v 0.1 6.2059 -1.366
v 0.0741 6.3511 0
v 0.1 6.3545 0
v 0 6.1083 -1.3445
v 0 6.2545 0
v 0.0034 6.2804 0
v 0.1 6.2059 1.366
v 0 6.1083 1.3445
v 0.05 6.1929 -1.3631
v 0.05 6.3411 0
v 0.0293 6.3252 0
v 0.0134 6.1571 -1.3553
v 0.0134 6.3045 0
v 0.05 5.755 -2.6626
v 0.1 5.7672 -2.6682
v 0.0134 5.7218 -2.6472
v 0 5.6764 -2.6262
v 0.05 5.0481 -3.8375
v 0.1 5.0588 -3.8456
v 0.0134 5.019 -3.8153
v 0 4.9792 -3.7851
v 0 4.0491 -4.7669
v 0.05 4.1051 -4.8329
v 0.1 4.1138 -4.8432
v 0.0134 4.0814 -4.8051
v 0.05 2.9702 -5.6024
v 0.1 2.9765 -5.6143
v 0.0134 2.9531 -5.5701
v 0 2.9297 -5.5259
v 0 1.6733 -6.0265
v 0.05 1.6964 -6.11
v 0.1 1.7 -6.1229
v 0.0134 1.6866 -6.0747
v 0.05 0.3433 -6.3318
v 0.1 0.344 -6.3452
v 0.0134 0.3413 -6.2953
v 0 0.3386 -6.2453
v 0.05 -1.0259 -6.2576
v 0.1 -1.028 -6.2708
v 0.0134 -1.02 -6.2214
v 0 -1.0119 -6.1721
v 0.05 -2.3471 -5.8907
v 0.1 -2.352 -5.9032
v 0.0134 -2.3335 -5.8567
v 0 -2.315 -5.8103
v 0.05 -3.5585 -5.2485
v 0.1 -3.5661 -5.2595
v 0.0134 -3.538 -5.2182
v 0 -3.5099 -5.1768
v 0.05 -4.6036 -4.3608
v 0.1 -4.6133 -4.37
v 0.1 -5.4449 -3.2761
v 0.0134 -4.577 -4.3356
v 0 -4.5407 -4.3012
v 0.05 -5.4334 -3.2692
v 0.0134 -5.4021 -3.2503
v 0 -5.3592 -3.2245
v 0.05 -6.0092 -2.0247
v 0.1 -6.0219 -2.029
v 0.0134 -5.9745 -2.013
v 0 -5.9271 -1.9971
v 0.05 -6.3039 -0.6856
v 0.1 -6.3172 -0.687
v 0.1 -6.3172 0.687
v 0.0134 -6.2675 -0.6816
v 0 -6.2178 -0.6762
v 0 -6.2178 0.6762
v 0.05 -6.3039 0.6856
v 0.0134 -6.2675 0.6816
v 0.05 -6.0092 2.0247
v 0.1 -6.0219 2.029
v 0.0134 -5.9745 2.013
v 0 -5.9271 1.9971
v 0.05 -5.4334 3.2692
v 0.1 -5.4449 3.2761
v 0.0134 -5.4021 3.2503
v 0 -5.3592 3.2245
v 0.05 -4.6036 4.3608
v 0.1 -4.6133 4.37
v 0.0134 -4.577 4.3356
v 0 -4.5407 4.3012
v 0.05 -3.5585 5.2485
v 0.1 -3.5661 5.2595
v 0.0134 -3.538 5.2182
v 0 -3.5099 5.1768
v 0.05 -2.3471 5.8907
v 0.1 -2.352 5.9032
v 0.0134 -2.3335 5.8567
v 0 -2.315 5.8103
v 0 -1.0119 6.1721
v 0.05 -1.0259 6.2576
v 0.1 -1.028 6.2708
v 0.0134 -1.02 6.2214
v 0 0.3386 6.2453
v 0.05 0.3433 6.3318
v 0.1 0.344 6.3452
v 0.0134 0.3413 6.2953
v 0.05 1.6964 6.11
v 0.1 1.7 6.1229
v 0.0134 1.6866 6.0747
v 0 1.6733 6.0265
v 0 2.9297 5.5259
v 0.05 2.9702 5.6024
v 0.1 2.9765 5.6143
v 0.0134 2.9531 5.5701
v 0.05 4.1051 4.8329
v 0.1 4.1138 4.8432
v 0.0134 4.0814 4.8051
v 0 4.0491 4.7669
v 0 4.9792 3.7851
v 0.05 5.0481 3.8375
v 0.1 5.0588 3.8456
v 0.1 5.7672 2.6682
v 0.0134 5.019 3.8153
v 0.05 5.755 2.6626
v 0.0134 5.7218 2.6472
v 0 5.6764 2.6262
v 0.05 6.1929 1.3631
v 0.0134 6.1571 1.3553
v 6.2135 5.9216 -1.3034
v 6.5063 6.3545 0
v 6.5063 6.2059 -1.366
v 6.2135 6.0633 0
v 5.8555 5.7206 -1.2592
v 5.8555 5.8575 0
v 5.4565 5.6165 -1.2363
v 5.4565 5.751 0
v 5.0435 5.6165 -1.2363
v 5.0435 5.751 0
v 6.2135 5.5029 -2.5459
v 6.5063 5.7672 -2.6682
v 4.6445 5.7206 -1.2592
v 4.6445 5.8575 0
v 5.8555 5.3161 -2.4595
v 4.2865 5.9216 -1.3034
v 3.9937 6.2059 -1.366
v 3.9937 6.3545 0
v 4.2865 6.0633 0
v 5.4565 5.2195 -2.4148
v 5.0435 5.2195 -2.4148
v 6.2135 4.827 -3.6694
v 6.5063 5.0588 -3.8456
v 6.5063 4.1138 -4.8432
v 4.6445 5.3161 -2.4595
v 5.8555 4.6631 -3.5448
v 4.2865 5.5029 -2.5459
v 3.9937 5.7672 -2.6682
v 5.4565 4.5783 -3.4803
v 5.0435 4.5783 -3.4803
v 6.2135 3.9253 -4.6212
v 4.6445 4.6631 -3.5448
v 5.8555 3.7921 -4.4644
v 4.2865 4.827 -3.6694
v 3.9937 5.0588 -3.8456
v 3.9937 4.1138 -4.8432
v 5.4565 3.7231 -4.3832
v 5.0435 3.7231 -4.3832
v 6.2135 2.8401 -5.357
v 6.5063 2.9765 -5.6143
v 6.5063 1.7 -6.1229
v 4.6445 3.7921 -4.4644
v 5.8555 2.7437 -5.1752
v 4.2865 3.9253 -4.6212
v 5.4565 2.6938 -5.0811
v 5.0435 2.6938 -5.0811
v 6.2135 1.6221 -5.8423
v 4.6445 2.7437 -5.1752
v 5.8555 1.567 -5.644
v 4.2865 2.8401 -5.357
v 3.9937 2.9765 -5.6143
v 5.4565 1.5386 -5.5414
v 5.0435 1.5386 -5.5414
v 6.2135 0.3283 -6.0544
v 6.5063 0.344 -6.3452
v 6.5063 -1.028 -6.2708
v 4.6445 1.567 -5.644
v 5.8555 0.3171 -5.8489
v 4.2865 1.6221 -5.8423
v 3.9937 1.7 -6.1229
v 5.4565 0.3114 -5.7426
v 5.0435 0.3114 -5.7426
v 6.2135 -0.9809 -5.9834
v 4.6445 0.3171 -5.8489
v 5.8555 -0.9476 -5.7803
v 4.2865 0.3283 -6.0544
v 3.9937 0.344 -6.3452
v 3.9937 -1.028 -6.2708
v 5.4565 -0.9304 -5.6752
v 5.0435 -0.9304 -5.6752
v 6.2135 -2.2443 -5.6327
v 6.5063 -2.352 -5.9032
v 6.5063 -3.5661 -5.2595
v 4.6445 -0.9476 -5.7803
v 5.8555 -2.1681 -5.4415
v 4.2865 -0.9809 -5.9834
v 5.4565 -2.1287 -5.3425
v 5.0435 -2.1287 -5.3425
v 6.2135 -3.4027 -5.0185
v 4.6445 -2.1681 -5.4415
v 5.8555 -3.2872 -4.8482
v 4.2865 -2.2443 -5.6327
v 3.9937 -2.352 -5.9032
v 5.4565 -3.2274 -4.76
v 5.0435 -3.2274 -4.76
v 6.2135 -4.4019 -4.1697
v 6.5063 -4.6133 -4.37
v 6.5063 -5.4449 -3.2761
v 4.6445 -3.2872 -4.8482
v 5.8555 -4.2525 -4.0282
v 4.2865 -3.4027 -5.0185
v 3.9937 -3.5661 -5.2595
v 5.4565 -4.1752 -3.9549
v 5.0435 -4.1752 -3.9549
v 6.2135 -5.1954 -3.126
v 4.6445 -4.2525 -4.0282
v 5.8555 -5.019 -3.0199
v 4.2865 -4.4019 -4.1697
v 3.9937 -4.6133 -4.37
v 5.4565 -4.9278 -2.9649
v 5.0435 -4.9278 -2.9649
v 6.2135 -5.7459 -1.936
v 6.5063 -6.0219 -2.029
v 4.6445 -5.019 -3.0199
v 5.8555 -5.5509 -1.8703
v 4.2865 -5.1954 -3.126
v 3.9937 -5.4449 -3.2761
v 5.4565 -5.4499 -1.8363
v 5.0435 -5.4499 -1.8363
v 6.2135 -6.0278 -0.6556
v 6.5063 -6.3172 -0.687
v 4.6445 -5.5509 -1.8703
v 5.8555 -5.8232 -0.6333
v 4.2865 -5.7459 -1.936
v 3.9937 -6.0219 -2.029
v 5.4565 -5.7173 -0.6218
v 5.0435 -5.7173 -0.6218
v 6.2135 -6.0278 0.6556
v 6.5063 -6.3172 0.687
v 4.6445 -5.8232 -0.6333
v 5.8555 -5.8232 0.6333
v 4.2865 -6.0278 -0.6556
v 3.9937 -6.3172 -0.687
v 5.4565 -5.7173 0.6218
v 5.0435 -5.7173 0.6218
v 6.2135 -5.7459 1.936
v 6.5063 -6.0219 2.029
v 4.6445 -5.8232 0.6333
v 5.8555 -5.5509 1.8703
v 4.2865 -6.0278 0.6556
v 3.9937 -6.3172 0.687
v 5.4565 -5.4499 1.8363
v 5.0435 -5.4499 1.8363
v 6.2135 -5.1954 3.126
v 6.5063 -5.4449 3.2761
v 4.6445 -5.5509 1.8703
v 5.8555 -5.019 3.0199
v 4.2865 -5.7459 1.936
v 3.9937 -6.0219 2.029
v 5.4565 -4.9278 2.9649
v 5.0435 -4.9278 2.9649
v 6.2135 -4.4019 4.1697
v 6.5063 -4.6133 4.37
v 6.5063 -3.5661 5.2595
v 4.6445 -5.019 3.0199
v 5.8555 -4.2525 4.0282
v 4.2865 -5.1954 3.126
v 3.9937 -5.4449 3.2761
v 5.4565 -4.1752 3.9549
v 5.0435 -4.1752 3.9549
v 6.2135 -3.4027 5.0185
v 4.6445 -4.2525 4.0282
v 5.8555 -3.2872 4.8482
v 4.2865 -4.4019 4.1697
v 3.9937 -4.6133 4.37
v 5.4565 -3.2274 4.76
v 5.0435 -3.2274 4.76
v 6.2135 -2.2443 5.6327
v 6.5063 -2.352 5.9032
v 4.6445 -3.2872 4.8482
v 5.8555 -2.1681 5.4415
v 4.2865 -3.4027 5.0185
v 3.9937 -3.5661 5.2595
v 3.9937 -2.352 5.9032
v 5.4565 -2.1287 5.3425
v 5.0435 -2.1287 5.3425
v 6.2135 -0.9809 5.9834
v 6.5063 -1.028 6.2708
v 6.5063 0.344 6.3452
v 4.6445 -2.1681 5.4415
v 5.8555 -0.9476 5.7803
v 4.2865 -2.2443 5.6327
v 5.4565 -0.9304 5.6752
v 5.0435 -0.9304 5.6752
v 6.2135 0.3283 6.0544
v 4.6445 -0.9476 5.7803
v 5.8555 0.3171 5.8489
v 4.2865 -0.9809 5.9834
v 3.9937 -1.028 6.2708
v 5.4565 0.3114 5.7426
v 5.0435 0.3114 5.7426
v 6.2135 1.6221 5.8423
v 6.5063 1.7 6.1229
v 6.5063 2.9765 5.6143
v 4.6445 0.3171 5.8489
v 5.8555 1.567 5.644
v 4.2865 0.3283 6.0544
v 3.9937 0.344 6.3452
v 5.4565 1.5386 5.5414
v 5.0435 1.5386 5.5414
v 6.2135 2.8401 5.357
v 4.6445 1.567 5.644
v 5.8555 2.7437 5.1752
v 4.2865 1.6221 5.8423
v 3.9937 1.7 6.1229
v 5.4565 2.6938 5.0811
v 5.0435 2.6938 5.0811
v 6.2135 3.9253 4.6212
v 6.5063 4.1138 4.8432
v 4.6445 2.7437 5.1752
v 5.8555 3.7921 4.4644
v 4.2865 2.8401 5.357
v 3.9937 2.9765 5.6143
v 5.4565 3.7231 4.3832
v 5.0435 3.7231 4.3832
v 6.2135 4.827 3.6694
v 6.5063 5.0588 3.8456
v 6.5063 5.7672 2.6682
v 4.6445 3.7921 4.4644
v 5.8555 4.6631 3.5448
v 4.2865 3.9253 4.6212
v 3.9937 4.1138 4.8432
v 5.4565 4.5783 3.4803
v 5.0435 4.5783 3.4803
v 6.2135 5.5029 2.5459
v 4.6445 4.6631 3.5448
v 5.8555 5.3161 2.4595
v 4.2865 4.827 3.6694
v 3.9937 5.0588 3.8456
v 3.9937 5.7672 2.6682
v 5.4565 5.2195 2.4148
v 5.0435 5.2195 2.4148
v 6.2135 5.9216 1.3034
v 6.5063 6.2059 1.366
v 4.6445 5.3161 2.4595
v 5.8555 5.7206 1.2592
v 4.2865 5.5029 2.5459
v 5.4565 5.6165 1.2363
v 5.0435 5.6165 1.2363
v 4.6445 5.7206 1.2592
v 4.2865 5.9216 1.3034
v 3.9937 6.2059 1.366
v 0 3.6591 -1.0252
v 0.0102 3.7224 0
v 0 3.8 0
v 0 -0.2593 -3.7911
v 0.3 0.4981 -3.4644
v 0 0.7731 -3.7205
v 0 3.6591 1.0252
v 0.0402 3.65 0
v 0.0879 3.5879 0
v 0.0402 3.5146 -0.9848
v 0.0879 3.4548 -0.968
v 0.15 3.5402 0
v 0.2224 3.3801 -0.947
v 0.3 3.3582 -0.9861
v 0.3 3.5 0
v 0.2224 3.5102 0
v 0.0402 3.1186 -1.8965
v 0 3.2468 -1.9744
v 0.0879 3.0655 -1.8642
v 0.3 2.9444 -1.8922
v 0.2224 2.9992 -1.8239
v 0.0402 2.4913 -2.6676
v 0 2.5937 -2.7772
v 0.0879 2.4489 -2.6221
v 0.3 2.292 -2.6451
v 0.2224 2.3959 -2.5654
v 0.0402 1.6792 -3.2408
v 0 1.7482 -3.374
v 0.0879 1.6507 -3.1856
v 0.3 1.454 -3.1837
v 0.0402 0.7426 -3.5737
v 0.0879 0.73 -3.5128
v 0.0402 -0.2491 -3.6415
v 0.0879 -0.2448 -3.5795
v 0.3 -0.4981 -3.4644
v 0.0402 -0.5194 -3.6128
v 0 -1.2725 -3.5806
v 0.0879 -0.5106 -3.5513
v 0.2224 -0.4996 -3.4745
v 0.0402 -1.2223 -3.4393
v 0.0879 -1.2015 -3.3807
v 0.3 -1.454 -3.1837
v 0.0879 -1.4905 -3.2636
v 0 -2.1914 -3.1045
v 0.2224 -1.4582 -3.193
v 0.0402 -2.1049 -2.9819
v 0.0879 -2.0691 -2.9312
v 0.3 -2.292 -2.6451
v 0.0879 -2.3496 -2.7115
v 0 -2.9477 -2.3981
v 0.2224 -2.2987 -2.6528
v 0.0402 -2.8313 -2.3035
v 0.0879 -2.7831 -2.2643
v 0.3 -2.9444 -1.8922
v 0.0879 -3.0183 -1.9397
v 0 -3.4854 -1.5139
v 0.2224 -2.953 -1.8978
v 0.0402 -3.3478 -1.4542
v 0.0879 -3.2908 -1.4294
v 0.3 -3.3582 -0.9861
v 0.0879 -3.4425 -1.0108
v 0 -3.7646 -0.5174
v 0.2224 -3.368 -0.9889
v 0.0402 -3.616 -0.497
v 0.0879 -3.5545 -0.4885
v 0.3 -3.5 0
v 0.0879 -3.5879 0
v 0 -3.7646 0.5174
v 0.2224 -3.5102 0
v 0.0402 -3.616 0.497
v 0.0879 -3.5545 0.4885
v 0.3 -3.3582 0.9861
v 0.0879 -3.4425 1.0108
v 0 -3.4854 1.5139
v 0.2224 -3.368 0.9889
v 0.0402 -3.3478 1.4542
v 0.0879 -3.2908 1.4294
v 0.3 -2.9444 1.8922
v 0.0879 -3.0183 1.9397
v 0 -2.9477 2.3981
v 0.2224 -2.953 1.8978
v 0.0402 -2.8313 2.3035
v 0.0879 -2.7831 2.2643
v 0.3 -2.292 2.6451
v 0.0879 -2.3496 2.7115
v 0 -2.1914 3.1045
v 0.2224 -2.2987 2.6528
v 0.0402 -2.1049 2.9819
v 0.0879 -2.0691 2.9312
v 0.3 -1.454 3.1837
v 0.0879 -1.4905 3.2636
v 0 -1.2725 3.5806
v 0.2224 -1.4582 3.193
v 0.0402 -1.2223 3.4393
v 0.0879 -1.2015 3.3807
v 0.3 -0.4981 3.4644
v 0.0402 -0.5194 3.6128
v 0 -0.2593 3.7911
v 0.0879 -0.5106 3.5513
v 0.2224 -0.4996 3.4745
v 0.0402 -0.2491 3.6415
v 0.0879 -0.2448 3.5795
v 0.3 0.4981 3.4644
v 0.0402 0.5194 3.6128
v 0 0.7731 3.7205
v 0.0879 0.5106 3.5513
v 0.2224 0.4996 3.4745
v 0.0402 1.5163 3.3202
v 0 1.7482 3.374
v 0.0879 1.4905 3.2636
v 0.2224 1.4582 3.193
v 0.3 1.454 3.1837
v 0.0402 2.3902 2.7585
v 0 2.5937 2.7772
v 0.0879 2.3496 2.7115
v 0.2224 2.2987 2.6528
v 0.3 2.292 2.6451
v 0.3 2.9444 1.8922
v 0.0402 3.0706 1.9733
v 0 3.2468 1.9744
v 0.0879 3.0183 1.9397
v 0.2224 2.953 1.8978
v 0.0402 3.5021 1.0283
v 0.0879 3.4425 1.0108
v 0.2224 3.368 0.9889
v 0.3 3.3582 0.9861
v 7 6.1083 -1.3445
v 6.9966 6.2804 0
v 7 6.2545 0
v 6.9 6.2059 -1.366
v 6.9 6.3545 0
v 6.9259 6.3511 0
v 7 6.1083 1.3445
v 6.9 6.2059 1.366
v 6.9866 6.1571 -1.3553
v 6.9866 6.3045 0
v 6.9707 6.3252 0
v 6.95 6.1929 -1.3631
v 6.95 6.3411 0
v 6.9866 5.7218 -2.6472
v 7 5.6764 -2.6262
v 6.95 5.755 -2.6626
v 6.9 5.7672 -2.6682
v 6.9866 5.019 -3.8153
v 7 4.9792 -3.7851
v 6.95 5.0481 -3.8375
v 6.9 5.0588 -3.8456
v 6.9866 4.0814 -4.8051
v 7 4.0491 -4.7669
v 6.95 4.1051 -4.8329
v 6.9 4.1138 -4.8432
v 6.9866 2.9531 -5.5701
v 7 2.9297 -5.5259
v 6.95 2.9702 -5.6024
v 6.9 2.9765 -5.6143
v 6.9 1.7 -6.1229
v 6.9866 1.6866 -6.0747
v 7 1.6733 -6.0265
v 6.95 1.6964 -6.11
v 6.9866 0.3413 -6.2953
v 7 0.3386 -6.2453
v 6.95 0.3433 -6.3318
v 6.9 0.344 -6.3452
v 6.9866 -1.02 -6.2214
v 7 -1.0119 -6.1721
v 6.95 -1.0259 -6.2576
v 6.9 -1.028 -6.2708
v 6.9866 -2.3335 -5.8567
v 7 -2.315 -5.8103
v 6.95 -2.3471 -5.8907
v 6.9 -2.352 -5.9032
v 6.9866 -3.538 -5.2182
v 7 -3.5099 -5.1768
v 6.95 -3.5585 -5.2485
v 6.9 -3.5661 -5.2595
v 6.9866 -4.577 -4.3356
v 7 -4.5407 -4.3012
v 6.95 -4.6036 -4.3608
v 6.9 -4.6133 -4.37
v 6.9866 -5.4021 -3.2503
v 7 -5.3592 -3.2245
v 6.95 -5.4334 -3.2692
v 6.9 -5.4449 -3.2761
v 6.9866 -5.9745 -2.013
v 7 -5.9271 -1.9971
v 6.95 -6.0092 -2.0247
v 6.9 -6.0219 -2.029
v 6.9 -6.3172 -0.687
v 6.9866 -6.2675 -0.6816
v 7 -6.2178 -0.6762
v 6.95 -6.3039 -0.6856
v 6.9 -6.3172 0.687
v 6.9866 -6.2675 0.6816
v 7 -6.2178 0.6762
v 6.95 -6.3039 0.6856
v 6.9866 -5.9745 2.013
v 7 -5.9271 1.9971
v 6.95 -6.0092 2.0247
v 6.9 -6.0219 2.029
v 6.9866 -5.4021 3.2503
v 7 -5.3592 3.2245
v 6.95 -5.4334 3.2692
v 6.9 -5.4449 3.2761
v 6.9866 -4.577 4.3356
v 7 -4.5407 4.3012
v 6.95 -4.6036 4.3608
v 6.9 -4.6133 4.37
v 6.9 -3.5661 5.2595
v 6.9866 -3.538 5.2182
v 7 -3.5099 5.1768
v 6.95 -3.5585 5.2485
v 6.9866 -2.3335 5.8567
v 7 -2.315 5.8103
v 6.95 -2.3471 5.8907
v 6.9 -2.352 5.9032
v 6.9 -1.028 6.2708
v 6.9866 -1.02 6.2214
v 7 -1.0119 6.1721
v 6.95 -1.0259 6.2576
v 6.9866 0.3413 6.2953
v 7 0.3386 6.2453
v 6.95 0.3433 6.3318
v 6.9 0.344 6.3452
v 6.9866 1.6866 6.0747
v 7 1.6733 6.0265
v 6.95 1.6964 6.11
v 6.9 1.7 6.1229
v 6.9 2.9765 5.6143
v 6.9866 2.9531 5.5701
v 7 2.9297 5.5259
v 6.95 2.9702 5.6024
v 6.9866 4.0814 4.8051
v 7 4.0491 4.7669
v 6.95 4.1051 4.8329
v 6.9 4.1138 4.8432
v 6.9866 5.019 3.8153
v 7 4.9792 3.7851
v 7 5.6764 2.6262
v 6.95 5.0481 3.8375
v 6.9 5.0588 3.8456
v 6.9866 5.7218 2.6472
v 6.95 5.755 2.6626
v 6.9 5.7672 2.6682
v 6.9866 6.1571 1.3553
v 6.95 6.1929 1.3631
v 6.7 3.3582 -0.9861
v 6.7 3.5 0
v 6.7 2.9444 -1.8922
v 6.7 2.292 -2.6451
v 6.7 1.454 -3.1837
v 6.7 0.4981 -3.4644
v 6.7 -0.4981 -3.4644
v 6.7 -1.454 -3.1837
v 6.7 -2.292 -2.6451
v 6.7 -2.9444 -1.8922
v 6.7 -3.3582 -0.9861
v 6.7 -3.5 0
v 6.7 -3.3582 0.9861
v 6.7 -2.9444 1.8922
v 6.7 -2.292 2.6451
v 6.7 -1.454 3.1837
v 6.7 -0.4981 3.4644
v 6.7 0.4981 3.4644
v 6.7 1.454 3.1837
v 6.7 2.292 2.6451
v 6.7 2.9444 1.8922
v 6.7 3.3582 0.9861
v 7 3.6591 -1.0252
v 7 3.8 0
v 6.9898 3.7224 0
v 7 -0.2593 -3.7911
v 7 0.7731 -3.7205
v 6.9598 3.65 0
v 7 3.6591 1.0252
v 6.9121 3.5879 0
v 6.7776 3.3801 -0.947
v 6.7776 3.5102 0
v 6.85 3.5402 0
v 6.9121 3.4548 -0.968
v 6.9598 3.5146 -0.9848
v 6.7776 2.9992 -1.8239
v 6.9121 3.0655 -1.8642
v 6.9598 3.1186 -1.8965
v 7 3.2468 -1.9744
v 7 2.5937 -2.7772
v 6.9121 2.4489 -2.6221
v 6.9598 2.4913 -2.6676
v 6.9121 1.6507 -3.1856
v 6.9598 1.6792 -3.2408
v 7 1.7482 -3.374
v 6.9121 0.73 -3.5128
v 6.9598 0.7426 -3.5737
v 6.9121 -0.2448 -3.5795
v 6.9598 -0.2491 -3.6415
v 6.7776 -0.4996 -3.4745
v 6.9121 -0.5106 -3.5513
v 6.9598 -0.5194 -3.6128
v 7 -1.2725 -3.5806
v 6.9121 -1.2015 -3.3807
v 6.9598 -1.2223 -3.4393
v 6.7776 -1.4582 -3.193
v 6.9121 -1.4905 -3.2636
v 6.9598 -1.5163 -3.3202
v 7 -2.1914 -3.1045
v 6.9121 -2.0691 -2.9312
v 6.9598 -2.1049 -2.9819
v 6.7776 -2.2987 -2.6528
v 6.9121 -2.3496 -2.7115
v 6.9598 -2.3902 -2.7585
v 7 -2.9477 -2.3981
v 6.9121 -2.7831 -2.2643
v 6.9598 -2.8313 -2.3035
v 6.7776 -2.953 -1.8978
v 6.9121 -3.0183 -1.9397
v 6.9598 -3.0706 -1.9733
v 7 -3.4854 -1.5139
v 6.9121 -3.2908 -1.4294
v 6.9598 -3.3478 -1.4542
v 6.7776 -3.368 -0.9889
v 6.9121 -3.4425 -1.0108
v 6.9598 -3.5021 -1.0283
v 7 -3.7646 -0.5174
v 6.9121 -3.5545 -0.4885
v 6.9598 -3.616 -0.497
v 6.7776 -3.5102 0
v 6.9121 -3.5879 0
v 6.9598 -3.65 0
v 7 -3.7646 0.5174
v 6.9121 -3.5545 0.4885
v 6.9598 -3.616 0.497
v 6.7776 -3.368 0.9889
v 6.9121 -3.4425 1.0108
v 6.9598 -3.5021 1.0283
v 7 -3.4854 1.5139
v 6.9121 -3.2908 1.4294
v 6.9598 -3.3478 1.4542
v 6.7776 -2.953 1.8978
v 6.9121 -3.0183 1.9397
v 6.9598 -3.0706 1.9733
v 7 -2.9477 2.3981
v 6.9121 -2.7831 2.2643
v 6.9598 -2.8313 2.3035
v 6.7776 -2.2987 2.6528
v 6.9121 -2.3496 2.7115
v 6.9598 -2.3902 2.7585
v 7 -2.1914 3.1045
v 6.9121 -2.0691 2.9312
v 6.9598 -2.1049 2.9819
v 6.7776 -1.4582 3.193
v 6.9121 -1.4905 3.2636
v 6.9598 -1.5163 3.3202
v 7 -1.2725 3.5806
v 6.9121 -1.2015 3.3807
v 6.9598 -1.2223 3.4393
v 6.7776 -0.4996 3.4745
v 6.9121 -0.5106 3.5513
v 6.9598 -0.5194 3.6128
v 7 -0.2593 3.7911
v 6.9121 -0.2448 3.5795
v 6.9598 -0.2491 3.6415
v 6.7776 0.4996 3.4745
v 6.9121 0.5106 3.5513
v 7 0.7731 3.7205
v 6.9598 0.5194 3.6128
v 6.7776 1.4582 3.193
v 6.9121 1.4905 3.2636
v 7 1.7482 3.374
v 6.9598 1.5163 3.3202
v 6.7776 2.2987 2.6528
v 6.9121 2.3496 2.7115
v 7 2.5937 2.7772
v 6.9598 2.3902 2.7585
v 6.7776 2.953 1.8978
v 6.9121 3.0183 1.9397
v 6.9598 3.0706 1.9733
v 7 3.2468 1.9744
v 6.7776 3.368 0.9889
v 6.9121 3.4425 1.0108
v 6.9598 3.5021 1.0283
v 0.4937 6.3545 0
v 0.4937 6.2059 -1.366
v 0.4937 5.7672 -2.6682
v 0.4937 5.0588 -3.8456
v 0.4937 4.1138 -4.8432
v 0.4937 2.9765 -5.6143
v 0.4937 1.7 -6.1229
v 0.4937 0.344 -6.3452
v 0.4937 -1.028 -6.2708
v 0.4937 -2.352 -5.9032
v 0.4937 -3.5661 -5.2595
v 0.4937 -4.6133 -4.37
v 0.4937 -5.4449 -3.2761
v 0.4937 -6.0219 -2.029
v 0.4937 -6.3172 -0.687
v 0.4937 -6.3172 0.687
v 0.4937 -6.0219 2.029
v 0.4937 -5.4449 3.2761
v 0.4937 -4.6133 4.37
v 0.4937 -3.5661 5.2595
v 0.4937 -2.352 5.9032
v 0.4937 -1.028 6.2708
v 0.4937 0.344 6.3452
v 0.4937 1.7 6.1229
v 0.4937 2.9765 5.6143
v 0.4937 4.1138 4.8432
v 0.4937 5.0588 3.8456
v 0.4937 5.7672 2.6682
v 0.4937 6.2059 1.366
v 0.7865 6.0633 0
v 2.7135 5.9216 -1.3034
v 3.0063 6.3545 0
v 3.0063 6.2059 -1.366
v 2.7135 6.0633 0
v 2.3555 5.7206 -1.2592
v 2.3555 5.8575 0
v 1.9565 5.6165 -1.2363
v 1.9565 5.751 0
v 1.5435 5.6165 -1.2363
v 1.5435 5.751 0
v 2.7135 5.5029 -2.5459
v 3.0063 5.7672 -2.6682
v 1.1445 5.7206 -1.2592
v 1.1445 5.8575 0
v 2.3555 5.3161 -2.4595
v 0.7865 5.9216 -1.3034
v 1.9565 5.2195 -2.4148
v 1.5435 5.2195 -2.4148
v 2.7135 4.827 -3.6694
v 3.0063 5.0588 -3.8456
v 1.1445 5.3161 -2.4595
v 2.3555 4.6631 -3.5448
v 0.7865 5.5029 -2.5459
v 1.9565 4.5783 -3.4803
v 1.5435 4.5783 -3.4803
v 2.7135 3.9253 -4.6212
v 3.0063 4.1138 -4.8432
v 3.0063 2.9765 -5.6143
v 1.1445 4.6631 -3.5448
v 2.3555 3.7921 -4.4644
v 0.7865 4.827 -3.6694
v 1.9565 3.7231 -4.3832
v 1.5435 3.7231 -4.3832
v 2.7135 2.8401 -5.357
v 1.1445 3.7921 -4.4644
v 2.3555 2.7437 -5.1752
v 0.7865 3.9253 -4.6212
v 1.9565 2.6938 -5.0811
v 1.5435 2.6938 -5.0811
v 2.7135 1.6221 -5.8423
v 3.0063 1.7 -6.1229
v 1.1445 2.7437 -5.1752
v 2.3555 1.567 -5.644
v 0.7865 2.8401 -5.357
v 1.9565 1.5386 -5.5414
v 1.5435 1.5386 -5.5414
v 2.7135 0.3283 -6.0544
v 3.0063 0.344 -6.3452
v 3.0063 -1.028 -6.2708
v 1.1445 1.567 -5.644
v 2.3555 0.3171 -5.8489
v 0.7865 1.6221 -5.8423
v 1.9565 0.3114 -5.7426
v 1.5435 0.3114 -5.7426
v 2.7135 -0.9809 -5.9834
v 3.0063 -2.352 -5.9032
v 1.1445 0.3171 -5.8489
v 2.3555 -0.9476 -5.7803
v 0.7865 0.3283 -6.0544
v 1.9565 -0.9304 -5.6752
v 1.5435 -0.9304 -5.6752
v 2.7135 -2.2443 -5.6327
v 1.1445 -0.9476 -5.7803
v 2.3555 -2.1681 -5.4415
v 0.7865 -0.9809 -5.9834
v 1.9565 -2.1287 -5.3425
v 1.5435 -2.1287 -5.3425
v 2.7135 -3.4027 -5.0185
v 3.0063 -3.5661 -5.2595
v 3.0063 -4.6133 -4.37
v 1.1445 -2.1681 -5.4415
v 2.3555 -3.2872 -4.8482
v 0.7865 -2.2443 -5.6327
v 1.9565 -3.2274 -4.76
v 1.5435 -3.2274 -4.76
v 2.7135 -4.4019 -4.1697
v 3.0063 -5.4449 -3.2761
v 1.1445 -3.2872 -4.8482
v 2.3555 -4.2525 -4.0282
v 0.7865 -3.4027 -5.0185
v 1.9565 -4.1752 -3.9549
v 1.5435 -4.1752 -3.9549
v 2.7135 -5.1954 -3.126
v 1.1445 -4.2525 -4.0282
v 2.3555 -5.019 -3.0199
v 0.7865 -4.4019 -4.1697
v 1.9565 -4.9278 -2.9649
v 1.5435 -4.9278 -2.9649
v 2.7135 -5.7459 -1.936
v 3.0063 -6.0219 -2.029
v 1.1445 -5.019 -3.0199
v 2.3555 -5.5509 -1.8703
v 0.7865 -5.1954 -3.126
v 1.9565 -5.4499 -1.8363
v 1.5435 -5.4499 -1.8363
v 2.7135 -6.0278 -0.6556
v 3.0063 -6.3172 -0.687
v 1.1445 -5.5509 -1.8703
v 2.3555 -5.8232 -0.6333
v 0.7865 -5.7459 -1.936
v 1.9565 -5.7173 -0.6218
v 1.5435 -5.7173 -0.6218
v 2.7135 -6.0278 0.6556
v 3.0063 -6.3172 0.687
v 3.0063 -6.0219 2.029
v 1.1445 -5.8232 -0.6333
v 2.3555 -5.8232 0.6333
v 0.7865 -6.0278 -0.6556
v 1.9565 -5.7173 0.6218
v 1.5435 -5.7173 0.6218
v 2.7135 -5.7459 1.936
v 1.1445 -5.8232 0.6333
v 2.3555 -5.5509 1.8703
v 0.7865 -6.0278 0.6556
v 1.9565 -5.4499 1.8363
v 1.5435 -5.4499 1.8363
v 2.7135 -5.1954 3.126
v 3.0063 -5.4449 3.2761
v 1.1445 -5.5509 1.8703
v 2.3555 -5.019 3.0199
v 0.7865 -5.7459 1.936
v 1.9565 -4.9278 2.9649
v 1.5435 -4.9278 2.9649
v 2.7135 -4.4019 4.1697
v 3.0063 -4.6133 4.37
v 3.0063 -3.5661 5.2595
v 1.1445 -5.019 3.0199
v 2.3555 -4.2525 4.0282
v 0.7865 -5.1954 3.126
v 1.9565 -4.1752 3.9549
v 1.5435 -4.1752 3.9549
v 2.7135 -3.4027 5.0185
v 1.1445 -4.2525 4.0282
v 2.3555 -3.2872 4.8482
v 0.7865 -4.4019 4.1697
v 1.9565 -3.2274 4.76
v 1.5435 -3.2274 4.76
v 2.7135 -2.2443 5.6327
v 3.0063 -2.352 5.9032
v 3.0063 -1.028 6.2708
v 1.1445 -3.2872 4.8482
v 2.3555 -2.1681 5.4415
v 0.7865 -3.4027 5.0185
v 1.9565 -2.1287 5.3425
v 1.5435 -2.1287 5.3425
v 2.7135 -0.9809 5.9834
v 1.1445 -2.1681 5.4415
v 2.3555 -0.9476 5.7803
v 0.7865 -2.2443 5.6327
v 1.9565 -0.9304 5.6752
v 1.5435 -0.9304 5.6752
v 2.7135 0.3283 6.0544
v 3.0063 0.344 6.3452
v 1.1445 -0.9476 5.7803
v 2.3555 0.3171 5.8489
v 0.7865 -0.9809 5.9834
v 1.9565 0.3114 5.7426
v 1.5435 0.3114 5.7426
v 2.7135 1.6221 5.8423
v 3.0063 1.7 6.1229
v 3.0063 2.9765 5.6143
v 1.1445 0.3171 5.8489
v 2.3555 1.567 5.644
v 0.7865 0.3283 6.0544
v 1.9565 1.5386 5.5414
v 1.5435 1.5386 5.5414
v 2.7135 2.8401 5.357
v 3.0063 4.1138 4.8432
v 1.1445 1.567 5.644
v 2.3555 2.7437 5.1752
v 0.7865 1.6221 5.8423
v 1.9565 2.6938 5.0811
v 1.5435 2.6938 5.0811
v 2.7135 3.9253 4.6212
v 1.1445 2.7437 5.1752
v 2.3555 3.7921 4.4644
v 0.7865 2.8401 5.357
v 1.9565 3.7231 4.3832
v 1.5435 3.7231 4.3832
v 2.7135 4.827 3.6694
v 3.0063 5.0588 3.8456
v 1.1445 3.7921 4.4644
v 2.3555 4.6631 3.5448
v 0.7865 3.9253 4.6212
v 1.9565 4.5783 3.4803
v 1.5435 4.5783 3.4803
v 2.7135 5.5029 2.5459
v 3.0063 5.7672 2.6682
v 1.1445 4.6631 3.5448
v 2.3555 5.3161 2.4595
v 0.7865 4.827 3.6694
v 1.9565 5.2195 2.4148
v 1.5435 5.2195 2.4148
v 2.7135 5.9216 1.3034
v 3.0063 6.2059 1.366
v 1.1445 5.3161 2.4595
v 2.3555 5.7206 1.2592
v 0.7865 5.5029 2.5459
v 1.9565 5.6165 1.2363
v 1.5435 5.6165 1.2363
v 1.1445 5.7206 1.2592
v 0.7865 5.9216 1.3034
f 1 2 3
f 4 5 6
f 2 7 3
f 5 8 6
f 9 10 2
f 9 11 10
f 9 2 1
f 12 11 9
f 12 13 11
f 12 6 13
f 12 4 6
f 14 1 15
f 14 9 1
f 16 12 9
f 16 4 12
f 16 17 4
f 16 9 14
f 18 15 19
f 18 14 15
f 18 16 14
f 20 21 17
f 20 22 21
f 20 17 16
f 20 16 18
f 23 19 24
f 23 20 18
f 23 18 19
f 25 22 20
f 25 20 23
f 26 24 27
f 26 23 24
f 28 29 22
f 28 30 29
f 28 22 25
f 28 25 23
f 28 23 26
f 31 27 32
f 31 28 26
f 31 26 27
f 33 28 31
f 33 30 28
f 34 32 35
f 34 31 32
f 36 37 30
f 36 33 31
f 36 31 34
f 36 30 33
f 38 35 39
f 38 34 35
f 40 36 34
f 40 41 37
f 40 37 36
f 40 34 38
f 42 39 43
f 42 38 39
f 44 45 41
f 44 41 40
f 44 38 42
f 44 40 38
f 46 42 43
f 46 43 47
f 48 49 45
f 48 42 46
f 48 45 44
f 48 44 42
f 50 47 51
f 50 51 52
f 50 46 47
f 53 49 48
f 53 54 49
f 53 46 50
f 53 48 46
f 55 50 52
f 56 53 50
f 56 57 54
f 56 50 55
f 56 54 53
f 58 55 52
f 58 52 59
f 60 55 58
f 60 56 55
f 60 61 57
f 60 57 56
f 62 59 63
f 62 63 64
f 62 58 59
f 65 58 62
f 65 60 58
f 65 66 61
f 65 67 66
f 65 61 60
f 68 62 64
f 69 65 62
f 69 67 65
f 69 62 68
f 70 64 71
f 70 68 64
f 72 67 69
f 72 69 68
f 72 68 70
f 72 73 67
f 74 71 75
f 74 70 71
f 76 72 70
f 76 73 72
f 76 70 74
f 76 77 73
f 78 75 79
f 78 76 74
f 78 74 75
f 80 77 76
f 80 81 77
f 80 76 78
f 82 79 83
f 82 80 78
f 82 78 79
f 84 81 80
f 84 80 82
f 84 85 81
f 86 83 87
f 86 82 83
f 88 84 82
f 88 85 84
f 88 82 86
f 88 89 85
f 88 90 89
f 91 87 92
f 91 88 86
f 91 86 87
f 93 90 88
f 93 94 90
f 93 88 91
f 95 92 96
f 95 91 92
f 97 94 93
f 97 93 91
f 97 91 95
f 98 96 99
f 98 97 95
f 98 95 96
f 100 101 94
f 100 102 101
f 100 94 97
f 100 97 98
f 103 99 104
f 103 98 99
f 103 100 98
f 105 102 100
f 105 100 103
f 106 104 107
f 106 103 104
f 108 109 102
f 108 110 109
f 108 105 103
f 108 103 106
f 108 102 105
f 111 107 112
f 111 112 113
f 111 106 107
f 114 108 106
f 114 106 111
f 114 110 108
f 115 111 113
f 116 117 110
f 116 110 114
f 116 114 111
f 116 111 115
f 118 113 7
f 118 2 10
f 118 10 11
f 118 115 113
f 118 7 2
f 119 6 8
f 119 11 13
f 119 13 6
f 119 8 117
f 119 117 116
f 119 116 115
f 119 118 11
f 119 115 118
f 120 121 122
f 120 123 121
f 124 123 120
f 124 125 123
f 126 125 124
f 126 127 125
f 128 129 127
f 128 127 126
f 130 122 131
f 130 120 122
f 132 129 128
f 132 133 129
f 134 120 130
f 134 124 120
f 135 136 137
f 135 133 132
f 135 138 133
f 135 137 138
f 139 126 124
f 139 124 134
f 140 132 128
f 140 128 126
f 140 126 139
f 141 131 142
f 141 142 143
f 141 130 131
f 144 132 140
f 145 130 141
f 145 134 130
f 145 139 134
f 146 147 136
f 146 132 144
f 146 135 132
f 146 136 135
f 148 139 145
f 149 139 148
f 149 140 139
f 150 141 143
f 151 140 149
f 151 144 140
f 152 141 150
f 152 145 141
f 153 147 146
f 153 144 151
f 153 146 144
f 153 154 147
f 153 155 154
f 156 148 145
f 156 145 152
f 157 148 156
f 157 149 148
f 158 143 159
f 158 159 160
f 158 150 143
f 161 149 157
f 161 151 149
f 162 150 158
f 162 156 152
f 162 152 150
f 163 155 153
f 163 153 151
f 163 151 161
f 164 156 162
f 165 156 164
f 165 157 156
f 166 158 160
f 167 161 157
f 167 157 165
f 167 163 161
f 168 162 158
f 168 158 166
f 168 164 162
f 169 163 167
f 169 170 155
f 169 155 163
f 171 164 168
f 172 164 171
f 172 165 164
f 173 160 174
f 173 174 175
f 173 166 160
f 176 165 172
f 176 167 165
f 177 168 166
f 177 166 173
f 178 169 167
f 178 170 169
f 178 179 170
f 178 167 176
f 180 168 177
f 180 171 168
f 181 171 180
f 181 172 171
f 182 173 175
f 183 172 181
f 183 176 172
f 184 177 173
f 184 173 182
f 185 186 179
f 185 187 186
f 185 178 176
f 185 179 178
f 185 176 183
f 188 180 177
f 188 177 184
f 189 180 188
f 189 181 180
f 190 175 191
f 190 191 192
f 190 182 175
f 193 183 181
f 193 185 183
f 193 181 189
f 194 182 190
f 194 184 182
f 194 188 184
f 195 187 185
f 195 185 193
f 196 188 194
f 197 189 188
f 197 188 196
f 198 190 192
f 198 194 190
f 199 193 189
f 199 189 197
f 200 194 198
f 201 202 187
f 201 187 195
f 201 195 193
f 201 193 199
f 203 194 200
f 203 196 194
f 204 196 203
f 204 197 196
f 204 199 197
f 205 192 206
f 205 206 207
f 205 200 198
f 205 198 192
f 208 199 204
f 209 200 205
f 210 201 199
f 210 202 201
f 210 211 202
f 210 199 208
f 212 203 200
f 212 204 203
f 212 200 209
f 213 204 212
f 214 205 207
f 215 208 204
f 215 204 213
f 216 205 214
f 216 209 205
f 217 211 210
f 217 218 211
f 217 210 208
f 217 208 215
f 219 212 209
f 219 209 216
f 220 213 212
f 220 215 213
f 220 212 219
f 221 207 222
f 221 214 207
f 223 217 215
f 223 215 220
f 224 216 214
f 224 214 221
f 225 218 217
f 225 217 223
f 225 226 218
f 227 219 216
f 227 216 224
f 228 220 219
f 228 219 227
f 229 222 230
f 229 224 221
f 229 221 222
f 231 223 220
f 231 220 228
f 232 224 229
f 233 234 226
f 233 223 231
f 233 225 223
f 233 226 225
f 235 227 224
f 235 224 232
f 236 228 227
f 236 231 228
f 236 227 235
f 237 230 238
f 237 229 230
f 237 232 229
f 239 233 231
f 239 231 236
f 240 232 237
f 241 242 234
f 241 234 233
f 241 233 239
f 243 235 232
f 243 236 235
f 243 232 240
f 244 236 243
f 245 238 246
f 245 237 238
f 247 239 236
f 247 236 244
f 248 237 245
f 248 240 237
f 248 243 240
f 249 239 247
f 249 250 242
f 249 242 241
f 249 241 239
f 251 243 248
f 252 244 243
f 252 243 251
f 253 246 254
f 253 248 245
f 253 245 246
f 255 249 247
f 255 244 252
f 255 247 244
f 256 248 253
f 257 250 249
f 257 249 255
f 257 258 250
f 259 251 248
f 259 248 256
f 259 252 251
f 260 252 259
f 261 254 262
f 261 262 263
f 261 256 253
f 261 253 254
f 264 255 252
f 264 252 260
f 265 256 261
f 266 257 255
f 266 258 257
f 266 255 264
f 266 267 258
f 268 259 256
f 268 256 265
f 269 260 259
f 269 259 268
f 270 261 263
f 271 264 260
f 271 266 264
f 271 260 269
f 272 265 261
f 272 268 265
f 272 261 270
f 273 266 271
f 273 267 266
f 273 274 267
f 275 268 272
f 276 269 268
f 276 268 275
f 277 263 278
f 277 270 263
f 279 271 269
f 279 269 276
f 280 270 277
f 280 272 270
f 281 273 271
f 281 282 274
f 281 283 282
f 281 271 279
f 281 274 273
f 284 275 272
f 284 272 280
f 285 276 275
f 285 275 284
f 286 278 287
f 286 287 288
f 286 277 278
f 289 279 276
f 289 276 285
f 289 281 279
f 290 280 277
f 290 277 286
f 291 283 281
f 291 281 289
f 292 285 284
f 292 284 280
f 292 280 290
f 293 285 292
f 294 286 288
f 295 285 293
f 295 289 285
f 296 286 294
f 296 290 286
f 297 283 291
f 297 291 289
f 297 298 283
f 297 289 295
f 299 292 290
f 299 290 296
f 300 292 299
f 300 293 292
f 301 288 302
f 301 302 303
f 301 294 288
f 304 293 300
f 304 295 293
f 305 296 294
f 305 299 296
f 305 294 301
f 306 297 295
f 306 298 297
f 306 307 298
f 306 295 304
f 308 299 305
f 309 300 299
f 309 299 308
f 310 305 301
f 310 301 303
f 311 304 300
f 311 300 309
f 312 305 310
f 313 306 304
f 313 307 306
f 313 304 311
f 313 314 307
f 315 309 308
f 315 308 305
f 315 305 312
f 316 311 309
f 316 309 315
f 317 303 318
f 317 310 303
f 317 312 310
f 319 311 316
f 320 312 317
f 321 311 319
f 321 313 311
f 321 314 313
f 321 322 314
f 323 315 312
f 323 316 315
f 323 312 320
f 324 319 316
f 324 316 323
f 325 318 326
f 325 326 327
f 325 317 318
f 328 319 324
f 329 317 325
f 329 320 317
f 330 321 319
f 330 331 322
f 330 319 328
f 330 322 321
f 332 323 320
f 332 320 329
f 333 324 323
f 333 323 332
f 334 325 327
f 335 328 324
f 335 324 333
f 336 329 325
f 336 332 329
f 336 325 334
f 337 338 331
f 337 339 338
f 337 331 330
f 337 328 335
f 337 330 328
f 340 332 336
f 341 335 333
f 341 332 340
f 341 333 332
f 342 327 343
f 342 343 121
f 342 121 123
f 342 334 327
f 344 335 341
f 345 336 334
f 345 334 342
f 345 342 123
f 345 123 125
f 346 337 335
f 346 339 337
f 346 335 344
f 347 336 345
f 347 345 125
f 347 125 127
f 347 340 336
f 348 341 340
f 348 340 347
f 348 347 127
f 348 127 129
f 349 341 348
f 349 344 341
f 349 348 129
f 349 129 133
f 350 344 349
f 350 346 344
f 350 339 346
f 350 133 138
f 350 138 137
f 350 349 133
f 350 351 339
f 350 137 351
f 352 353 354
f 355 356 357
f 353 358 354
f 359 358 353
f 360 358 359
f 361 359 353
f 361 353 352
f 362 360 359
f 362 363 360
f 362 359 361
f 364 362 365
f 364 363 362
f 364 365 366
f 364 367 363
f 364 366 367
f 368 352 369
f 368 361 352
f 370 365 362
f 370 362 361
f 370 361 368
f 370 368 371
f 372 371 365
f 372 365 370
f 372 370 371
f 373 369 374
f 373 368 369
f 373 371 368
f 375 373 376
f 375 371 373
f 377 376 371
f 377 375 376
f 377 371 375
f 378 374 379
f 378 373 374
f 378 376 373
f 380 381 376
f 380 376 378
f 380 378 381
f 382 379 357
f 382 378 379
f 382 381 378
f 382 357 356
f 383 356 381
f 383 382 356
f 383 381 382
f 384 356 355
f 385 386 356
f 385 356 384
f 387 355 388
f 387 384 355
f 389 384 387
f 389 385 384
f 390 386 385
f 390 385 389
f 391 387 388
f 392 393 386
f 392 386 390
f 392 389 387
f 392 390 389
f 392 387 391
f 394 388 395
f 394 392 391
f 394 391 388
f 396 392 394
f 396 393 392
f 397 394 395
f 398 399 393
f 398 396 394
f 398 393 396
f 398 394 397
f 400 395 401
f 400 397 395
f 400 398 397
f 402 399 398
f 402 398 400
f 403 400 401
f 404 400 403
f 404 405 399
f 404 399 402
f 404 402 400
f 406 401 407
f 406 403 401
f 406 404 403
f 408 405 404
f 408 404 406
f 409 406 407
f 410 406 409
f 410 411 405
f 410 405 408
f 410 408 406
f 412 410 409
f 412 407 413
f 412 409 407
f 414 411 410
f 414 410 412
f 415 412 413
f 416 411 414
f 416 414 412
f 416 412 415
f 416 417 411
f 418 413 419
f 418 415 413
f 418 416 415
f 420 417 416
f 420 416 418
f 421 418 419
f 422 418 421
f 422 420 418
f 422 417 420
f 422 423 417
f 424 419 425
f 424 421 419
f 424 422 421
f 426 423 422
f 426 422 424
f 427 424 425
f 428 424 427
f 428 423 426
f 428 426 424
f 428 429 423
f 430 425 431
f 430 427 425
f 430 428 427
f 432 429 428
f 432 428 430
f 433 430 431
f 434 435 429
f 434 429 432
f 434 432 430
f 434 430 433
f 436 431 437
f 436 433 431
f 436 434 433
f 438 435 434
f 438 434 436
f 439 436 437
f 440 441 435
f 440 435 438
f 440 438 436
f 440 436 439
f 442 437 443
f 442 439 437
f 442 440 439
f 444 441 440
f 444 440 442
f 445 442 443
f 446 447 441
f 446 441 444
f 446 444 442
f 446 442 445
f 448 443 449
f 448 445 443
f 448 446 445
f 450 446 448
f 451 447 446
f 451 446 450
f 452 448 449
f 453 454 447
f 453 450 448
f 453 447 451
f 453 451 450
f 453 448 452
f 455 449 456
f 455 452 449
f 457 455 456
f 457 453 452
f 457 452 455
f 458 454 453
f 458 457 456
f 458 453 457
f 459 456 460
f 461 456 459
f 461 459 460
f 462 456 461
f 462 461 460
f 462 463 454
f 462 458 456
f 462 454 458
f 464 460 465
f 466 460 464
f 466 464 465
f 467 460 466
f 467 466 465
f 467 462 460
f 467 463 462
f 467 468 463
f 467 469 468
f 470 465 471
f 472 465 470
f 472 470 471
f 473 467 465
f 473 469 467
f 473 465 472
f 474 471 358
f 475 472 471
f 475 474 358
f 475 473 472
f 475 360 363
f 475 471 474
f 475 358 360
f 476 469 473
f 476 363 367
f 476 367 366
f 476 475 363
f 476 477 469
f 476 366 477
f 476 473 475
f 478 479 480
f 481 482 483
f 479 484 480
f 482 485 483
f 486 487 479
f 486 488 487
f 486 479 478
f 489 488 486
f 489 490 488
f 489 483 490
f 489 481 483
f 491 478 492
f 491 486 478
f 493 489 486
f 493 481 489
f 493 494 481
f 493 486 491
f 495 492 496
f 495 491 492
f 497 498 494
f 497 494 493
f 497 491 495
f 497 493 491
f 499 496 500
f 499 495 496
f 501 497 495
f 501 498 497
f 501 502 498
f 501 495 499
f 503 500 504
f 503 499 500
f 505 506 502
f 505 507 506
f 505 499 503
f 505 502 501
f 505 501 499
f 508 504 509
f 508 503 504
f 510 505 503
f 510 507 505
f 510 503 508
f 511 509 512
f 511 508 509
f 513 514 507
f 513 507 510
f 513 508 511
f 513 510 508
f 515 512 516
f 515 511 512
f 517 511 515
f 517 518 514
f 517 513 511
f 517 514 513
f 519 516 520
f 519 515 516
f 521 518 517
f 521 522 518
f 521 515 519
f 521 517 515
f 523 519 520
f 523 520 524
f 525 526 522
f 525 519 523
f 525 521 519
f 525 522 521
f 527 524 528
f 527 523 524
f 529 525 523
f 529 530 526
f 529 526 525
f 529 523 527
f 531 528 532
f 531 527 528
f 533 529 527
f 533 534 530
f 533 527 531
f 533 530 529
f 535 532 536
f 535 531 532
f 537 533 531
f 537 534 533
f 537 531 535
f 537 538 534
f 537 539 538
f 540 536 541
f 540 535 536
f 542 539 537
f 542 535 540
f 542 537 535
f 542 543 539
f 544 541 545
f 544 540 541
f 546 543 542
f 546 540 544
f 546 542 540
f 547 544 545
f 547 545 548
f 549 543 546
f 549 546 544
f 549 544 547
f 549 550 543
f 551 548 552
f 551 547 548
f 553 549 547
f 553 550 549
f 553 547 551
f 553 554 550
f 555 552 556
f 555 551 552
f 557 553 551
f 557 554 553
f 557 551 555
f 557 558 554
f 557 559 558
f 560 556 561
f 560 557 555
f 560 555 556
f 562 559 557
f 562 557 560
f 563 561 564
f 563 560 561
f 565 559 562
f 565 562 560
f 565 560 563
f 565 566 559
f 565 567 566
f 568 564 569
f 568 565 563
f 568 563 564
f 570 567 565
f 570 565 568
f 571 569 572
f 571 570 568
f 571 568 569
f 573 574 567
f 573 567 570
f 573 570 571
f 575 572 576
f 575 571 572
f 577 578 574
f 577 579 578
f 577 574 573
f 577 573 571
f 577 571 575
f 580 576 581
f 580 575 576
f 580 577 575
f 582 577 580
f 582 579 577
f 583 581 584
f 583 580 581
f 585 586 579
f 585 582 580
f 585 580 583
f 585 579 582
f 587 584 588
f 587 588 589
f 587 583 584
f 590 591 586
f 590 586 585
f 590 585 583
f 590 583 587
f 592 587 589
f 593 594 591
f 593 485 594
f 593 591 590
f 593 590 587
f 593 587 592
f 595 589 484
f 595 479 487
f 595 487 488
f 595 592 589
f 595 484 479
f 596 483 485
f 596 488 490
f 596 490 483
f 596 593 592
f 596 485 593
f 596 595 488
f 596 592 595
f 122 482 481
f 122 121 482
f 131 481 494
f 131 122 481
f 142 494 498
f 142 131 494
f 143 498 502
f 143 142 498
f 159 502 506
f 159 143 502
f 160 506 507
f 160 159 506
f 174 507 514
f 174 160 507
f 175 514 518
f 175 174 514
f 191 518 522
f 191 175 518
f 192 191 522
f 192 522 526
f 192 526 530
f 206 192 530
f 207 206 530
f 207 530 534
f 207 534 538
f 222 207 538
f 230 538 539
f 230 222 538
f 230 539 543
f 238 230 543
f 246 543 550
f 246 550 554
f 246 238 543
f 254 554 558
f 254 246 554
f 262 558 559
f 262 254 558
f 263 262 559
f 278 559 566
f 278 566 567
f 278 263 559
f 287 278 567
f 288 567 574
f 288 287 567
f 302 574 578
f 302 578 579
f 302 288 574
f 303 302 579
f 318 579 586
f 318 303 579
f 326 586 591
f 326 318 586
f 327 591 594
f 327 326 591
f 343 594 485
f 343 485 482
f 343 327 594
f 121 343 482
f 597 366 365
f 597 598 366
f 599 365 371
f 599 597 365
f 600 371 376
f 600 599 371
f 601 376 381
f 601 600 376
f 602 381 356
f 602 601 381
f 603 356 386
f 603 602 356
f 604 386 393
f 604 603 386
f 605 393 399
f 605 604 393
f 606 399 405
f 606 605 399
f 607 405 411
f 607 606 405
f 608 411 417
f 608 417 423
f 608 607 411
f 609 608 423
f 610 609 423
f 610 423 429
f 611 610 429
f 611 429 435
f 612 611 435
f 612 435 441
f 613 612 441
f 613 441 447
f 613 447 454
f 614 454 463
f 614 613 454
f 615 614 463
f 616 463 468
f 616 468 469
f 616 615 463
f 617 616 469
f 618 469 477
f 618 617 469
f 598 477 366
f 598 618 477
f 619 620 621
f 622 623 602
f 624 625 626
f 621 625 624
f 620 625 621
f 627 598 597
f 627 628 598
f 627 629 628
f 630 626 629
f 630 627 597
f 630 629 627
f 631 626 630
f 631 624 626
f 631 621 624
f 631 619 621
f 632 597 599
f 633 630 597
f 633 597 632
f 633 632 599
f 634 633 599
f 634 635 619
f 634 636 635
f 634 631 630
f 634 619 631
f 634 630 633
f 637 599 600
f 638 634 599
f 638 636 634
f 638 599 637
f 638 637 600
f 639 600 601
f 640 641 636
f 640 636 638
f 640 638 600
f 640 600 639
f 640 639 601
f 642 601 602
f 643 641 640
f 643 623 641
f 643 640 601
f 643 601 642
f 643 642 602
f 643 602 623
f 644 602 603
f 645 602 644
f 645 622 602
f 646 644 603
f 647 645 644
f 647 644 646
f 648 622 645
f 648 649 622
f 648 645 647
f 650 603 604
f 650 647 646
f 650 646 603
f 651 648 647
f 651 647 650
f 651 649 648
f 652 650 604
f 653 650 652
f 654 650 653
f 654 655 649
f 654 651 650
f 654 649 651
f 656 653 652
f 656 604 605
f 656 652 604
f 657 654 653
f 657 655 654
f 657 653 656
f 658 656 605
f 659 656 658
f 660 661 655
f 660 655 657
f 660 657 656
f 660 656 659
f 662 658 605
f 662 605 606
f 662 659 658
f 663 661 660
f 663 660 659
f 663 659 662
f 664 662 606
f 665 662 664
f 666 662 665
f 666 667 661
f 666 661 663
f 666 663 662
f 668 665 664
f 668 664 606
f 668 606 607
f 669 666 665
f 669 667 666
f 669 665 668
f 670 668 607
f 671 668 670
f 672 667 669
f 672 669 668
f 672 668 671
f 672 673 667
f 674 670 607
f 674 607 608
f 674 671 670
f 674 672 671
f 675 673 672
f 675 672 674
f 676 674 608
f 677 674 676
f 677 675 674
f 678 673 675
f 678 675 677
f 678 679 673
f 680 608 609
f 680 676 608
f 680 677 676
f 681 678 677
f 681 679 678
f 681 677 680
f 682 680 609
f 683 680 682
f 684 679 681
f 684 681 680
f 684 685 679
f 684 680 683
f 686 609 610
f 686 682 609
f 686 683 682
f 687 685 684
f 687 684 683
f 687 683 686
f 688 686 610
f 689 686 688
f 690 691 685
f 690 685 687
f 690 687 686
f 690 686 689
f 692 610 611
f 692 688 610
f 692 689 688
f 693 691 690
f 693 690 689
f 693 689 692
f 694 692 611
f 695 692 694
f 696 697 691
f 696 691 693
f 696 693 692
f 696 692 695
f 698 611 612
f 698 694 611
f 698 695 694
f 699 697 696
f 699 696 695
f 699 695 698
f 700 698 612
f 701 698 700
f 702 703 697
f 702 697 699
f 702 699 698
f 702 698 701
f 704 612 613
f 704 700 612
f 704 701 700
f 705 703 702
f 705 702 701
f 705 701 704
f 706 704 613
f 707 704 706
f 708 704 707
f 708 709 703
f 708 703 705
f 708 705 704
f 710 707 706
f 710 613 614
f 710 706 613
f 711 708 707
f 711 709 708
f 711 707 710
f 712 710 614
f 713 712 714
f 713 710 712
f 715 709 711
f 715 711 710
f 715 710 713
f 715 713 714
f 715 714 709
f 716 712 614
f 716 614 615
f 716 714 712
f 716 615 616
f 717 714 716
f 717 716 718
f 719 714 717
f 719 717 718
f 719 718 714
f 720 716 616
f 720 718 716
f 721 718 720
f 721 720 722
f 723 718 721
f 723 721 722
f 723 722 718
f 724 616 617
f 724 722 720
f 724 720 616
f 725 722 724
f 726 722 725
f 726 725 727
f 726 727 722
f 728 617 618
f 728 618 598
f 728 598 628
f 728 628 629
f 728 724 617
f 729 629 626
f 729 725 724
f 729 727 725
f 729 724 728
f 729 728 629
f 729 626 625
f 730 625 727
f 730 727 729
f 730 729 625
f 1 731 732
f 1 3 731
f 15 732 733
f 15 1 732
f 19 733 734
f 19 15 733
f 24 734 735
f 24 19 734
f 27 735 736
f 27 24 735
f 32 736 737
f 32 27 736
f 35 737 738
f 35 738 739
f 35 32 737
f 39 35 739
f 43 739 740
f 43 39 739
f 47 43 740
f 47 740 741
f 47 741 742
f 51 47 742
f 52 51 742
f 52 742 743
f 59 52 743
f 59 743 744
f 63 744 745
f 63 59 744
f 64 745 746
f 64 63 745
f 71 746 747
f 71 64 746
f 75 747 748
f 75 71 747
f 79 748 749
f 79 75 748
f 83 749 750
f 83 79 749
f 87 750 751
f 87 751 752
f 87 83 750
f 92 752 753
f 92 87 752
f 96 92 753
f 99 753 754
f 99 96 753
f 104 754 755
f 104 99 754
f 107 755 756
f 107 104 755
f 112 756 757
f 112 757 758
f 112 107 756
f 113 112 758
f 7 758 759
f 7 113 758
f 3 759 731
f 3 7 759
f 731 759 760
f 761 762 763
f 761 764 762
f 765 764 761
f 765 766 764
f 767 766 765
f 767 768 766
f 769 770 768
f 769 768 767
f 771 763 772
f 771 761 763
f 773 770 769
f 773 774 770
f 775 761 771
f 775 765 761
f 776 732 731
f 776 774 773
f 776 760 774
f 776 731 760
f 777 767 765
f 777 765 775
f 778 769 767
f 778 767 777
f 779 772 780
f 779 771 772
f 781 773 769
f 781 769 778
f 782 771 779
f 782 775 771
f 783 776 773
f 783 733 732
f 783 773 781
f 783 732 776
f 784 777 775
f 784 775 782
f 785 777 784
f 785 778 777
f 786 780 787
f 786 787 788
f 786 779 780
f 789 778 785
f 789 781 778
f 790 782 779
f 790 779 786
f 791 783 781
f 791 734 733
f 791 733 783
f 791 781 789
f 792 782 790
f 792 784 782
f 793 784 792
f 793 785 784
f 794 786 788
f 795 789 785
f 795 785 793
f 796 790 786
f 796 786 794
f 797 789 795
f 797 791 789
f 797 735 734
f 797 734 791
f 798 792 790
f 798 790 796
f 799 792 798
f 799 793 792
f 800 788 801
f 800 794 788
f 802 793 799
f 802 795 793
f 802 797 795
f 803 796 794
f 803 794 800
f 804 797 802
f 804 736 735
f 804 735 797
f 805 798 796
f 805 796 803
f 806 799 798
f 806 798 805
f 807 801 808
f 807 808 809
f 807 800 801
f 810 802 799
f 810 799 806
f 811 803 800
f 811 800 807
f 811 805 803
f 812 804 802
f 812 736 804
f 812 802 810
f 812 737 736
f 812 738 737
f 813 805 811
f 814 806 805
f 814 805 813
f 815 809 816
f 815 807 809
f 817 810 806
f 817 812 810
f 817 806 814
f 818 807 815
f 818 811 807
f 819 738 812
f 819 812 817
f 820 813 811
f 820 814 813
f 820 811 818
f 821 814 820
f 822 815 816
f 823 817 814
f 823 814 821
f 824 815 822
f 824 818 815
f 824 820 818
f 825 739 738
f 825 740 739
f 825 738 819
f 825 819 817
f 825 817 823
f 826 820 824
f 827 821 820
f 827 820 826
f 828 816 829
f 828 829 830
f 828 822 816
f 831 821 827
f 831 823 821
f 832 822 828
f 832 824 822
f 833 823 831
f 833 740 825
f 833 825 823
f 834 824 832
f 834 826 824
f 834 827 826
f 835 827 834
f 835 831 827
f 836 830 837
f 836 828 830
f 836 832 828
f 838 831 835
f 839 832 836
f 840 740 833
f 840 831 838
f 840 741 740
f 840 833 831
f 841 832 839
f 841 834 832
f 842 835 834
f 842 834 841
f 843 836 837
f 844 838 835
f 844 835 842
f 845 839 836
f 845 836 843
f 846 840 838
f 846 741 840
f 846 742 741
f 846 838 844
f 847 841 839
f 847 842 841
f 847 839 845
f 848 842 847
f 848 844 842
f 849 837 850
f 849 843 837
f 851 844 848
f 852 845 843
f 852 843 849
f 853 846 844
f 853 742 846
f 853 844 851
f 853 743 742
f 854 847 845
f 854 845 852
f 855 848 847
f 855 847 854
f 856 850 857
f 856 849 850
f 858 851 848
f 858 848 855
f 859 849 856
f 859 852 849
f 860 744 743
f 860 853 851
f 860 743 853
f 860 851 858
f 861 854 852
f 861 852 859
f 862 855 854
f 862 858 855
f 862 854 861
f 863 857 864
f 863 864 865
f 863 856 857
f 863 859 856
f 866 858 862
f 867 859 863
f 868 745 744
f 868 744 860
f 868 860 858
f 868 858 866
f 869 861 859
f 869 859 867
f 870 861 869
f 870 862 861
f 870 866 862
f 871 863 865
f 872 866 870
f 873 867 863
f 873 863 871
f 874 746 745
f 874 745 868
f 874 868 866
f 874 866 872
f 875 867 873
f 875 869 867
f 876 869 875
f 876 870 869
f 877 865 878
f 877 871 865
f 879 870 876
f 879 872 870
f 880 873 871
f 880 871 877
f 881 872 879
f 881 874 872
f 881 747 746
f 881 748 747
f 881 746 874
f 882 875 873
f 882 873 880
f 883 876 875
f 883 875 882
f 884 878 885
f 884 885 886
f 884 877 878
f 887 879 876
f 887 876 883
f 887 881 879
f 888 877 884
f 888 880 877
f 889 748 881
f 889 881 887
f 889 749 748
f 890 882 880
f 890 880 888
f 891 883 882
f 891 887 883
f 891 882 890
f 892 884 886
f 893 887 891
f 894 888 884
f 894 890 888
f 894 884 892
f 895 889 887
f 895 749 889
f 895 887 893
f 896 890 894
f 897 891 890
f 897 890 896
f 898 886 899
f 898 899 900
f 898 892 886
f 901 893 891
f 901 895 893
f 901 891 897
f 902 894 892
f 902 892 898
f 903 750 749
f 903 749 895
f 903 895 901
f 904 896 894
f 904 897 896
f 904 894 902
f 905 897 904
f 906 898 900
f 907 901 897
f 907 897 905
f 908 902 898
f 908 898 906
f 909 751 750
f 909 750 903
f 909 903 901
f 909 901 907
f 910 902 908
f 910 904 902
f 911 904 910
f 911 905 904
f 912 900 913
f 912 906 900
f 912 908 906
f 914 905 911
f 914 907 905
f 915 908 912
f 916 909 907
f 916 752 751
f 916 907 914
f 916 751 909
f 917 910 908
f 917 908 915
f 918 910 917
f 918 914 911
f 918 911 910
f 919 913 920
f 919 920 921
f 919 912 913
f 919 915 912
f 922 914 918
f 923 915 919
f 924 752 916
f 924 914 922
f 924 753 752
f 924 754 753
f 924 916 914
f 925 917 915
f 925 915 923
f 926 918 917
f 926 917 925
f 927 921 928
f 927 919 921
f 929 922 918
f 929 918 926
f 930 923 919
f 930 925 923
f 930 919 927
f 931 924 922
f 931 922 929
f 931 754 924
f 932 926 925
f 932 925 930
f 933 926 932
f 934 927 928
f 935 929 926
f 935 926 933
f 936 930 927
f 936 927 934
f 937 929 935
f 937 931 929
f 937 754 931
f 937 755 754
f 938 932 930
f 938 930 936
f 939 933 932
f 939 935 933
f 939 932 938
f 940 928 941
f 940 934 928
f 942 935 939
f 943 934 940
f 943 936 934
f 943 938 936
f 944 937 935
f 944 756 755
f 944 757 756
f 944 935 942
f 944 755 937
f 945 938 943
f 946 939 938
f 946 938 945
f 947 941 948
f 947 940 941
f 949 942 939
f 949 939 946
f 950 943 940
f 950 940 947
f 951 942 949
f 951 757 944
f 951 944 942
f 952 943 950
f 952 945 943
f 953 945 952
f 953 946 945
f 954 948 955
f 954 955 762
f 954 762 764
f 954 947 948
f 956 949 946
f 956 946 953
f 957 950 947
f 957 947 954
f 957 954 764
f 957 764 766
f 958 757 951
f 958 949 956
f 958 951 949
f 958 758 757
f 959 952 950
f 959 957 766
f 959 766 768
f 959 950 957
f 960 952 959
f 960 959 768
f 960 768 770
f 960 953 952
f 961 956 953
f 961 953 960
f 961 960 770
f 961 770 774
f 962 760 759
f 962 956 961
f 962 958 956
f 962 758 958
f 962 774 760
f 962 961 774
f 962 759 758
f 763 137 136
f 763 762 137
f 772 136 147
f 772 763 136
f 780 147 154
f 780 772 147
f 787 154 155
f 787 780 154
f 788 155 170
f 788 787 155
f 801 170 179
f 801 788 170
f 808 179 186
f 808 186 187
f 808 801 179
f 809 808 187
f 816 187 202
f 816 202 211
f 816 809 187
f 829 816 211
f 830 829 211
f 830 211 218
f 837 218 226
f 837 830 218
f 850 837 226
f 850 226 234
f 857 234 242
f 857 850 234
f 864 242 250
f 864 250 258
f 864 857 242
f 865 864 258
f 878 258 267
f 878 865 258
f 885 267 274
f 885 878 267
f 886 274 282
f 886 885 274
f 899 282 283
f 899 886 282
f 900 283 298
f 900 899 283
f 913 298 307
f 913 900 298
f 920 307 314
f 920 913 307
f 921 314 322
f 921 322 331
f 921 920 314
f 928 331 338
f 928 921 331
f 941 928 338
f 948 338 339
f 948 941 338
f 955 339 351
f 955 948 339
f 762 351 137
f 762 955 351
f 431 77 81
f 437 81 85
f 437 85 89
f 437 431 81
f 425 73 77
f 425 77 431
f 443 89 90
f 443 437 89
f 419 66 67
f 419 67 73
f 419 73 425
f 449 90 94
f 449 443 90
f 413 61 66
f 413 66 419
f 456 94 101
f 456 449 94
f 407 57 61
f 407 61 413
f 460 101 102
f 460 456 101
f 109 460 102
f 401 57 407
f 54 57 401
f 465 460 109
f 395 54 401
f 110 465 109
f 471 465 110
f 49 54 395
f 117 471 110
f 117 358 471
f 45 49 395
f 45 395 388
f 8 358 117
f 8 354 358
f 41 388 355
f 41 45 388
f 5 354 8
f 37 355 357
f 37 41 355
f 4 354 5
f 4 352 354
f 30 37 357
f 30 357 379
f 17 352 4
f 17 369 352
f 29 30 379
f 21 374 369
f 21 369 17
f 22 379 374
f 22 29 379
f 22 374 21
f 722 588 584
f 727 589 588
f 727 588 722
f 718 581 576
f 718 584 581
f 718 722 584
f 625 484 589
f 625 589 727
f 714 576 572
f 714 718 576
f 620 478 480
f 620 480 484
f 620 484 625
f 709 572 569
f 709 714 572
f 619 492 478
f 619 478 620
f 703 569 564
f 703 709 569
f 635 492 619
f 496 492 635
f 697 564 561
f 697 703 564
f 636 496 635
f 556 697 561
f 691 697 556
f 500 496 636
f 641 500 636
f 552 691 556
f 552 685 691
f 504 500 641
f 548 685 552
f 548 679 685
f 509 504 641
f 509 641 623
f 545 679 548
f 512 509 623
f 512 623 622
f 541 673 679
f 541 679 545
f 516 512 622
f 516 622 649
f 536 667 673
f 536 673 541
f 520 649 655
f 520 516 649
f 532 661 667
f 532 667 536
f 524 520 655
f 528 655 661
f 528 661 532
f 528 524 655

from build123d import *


with BuildPart() as part:
    # Sketch1 → Revolve1 (revolve)
    with BuildSketch(Plane.XY):
        with BuildLine():
            Line((0, 6.2545), (0, 3.8))
            ThreePointArc((0, 3.8), (0.087867966, 3.587867966), (0.3, 3.5))
            Line((0.3, 3.5), (6.7, 3.5))
            ThreePointArc((6.7, 3.5), (6.912132034, 3.587867966), (7, 3.8))
            Line((7, 3.8), (7, 6.2545))
            ThreePointArc((7, 6.2545), (6.970710678, 6.325210678), (6.9, 6.3545))
            Line((6.9, 6.3545), (6.506298531, 6.3545))
            ThreePointArc((6.506298531, 6.3545), (5.25, 5.7375), (3.993701469, 6.3545))
            Line((3.993701469, 6.3545), (3.006298531, 6.3545))
            ThreePointArc((3.006298531, 6.3545), (1.75, 5.7375), (0.493701469, 6.3545))
            Line((0.493701469, 6.3545), (0.1, 6.3545))
            ThreePointArc((0.1, 6.3545), (0.029289322, 6.325210678), (0, 6.2545))
        make_face()
    revolve(axis=Axis((50, 0, 0), (-1, 0, 0)))


solid = part.part
